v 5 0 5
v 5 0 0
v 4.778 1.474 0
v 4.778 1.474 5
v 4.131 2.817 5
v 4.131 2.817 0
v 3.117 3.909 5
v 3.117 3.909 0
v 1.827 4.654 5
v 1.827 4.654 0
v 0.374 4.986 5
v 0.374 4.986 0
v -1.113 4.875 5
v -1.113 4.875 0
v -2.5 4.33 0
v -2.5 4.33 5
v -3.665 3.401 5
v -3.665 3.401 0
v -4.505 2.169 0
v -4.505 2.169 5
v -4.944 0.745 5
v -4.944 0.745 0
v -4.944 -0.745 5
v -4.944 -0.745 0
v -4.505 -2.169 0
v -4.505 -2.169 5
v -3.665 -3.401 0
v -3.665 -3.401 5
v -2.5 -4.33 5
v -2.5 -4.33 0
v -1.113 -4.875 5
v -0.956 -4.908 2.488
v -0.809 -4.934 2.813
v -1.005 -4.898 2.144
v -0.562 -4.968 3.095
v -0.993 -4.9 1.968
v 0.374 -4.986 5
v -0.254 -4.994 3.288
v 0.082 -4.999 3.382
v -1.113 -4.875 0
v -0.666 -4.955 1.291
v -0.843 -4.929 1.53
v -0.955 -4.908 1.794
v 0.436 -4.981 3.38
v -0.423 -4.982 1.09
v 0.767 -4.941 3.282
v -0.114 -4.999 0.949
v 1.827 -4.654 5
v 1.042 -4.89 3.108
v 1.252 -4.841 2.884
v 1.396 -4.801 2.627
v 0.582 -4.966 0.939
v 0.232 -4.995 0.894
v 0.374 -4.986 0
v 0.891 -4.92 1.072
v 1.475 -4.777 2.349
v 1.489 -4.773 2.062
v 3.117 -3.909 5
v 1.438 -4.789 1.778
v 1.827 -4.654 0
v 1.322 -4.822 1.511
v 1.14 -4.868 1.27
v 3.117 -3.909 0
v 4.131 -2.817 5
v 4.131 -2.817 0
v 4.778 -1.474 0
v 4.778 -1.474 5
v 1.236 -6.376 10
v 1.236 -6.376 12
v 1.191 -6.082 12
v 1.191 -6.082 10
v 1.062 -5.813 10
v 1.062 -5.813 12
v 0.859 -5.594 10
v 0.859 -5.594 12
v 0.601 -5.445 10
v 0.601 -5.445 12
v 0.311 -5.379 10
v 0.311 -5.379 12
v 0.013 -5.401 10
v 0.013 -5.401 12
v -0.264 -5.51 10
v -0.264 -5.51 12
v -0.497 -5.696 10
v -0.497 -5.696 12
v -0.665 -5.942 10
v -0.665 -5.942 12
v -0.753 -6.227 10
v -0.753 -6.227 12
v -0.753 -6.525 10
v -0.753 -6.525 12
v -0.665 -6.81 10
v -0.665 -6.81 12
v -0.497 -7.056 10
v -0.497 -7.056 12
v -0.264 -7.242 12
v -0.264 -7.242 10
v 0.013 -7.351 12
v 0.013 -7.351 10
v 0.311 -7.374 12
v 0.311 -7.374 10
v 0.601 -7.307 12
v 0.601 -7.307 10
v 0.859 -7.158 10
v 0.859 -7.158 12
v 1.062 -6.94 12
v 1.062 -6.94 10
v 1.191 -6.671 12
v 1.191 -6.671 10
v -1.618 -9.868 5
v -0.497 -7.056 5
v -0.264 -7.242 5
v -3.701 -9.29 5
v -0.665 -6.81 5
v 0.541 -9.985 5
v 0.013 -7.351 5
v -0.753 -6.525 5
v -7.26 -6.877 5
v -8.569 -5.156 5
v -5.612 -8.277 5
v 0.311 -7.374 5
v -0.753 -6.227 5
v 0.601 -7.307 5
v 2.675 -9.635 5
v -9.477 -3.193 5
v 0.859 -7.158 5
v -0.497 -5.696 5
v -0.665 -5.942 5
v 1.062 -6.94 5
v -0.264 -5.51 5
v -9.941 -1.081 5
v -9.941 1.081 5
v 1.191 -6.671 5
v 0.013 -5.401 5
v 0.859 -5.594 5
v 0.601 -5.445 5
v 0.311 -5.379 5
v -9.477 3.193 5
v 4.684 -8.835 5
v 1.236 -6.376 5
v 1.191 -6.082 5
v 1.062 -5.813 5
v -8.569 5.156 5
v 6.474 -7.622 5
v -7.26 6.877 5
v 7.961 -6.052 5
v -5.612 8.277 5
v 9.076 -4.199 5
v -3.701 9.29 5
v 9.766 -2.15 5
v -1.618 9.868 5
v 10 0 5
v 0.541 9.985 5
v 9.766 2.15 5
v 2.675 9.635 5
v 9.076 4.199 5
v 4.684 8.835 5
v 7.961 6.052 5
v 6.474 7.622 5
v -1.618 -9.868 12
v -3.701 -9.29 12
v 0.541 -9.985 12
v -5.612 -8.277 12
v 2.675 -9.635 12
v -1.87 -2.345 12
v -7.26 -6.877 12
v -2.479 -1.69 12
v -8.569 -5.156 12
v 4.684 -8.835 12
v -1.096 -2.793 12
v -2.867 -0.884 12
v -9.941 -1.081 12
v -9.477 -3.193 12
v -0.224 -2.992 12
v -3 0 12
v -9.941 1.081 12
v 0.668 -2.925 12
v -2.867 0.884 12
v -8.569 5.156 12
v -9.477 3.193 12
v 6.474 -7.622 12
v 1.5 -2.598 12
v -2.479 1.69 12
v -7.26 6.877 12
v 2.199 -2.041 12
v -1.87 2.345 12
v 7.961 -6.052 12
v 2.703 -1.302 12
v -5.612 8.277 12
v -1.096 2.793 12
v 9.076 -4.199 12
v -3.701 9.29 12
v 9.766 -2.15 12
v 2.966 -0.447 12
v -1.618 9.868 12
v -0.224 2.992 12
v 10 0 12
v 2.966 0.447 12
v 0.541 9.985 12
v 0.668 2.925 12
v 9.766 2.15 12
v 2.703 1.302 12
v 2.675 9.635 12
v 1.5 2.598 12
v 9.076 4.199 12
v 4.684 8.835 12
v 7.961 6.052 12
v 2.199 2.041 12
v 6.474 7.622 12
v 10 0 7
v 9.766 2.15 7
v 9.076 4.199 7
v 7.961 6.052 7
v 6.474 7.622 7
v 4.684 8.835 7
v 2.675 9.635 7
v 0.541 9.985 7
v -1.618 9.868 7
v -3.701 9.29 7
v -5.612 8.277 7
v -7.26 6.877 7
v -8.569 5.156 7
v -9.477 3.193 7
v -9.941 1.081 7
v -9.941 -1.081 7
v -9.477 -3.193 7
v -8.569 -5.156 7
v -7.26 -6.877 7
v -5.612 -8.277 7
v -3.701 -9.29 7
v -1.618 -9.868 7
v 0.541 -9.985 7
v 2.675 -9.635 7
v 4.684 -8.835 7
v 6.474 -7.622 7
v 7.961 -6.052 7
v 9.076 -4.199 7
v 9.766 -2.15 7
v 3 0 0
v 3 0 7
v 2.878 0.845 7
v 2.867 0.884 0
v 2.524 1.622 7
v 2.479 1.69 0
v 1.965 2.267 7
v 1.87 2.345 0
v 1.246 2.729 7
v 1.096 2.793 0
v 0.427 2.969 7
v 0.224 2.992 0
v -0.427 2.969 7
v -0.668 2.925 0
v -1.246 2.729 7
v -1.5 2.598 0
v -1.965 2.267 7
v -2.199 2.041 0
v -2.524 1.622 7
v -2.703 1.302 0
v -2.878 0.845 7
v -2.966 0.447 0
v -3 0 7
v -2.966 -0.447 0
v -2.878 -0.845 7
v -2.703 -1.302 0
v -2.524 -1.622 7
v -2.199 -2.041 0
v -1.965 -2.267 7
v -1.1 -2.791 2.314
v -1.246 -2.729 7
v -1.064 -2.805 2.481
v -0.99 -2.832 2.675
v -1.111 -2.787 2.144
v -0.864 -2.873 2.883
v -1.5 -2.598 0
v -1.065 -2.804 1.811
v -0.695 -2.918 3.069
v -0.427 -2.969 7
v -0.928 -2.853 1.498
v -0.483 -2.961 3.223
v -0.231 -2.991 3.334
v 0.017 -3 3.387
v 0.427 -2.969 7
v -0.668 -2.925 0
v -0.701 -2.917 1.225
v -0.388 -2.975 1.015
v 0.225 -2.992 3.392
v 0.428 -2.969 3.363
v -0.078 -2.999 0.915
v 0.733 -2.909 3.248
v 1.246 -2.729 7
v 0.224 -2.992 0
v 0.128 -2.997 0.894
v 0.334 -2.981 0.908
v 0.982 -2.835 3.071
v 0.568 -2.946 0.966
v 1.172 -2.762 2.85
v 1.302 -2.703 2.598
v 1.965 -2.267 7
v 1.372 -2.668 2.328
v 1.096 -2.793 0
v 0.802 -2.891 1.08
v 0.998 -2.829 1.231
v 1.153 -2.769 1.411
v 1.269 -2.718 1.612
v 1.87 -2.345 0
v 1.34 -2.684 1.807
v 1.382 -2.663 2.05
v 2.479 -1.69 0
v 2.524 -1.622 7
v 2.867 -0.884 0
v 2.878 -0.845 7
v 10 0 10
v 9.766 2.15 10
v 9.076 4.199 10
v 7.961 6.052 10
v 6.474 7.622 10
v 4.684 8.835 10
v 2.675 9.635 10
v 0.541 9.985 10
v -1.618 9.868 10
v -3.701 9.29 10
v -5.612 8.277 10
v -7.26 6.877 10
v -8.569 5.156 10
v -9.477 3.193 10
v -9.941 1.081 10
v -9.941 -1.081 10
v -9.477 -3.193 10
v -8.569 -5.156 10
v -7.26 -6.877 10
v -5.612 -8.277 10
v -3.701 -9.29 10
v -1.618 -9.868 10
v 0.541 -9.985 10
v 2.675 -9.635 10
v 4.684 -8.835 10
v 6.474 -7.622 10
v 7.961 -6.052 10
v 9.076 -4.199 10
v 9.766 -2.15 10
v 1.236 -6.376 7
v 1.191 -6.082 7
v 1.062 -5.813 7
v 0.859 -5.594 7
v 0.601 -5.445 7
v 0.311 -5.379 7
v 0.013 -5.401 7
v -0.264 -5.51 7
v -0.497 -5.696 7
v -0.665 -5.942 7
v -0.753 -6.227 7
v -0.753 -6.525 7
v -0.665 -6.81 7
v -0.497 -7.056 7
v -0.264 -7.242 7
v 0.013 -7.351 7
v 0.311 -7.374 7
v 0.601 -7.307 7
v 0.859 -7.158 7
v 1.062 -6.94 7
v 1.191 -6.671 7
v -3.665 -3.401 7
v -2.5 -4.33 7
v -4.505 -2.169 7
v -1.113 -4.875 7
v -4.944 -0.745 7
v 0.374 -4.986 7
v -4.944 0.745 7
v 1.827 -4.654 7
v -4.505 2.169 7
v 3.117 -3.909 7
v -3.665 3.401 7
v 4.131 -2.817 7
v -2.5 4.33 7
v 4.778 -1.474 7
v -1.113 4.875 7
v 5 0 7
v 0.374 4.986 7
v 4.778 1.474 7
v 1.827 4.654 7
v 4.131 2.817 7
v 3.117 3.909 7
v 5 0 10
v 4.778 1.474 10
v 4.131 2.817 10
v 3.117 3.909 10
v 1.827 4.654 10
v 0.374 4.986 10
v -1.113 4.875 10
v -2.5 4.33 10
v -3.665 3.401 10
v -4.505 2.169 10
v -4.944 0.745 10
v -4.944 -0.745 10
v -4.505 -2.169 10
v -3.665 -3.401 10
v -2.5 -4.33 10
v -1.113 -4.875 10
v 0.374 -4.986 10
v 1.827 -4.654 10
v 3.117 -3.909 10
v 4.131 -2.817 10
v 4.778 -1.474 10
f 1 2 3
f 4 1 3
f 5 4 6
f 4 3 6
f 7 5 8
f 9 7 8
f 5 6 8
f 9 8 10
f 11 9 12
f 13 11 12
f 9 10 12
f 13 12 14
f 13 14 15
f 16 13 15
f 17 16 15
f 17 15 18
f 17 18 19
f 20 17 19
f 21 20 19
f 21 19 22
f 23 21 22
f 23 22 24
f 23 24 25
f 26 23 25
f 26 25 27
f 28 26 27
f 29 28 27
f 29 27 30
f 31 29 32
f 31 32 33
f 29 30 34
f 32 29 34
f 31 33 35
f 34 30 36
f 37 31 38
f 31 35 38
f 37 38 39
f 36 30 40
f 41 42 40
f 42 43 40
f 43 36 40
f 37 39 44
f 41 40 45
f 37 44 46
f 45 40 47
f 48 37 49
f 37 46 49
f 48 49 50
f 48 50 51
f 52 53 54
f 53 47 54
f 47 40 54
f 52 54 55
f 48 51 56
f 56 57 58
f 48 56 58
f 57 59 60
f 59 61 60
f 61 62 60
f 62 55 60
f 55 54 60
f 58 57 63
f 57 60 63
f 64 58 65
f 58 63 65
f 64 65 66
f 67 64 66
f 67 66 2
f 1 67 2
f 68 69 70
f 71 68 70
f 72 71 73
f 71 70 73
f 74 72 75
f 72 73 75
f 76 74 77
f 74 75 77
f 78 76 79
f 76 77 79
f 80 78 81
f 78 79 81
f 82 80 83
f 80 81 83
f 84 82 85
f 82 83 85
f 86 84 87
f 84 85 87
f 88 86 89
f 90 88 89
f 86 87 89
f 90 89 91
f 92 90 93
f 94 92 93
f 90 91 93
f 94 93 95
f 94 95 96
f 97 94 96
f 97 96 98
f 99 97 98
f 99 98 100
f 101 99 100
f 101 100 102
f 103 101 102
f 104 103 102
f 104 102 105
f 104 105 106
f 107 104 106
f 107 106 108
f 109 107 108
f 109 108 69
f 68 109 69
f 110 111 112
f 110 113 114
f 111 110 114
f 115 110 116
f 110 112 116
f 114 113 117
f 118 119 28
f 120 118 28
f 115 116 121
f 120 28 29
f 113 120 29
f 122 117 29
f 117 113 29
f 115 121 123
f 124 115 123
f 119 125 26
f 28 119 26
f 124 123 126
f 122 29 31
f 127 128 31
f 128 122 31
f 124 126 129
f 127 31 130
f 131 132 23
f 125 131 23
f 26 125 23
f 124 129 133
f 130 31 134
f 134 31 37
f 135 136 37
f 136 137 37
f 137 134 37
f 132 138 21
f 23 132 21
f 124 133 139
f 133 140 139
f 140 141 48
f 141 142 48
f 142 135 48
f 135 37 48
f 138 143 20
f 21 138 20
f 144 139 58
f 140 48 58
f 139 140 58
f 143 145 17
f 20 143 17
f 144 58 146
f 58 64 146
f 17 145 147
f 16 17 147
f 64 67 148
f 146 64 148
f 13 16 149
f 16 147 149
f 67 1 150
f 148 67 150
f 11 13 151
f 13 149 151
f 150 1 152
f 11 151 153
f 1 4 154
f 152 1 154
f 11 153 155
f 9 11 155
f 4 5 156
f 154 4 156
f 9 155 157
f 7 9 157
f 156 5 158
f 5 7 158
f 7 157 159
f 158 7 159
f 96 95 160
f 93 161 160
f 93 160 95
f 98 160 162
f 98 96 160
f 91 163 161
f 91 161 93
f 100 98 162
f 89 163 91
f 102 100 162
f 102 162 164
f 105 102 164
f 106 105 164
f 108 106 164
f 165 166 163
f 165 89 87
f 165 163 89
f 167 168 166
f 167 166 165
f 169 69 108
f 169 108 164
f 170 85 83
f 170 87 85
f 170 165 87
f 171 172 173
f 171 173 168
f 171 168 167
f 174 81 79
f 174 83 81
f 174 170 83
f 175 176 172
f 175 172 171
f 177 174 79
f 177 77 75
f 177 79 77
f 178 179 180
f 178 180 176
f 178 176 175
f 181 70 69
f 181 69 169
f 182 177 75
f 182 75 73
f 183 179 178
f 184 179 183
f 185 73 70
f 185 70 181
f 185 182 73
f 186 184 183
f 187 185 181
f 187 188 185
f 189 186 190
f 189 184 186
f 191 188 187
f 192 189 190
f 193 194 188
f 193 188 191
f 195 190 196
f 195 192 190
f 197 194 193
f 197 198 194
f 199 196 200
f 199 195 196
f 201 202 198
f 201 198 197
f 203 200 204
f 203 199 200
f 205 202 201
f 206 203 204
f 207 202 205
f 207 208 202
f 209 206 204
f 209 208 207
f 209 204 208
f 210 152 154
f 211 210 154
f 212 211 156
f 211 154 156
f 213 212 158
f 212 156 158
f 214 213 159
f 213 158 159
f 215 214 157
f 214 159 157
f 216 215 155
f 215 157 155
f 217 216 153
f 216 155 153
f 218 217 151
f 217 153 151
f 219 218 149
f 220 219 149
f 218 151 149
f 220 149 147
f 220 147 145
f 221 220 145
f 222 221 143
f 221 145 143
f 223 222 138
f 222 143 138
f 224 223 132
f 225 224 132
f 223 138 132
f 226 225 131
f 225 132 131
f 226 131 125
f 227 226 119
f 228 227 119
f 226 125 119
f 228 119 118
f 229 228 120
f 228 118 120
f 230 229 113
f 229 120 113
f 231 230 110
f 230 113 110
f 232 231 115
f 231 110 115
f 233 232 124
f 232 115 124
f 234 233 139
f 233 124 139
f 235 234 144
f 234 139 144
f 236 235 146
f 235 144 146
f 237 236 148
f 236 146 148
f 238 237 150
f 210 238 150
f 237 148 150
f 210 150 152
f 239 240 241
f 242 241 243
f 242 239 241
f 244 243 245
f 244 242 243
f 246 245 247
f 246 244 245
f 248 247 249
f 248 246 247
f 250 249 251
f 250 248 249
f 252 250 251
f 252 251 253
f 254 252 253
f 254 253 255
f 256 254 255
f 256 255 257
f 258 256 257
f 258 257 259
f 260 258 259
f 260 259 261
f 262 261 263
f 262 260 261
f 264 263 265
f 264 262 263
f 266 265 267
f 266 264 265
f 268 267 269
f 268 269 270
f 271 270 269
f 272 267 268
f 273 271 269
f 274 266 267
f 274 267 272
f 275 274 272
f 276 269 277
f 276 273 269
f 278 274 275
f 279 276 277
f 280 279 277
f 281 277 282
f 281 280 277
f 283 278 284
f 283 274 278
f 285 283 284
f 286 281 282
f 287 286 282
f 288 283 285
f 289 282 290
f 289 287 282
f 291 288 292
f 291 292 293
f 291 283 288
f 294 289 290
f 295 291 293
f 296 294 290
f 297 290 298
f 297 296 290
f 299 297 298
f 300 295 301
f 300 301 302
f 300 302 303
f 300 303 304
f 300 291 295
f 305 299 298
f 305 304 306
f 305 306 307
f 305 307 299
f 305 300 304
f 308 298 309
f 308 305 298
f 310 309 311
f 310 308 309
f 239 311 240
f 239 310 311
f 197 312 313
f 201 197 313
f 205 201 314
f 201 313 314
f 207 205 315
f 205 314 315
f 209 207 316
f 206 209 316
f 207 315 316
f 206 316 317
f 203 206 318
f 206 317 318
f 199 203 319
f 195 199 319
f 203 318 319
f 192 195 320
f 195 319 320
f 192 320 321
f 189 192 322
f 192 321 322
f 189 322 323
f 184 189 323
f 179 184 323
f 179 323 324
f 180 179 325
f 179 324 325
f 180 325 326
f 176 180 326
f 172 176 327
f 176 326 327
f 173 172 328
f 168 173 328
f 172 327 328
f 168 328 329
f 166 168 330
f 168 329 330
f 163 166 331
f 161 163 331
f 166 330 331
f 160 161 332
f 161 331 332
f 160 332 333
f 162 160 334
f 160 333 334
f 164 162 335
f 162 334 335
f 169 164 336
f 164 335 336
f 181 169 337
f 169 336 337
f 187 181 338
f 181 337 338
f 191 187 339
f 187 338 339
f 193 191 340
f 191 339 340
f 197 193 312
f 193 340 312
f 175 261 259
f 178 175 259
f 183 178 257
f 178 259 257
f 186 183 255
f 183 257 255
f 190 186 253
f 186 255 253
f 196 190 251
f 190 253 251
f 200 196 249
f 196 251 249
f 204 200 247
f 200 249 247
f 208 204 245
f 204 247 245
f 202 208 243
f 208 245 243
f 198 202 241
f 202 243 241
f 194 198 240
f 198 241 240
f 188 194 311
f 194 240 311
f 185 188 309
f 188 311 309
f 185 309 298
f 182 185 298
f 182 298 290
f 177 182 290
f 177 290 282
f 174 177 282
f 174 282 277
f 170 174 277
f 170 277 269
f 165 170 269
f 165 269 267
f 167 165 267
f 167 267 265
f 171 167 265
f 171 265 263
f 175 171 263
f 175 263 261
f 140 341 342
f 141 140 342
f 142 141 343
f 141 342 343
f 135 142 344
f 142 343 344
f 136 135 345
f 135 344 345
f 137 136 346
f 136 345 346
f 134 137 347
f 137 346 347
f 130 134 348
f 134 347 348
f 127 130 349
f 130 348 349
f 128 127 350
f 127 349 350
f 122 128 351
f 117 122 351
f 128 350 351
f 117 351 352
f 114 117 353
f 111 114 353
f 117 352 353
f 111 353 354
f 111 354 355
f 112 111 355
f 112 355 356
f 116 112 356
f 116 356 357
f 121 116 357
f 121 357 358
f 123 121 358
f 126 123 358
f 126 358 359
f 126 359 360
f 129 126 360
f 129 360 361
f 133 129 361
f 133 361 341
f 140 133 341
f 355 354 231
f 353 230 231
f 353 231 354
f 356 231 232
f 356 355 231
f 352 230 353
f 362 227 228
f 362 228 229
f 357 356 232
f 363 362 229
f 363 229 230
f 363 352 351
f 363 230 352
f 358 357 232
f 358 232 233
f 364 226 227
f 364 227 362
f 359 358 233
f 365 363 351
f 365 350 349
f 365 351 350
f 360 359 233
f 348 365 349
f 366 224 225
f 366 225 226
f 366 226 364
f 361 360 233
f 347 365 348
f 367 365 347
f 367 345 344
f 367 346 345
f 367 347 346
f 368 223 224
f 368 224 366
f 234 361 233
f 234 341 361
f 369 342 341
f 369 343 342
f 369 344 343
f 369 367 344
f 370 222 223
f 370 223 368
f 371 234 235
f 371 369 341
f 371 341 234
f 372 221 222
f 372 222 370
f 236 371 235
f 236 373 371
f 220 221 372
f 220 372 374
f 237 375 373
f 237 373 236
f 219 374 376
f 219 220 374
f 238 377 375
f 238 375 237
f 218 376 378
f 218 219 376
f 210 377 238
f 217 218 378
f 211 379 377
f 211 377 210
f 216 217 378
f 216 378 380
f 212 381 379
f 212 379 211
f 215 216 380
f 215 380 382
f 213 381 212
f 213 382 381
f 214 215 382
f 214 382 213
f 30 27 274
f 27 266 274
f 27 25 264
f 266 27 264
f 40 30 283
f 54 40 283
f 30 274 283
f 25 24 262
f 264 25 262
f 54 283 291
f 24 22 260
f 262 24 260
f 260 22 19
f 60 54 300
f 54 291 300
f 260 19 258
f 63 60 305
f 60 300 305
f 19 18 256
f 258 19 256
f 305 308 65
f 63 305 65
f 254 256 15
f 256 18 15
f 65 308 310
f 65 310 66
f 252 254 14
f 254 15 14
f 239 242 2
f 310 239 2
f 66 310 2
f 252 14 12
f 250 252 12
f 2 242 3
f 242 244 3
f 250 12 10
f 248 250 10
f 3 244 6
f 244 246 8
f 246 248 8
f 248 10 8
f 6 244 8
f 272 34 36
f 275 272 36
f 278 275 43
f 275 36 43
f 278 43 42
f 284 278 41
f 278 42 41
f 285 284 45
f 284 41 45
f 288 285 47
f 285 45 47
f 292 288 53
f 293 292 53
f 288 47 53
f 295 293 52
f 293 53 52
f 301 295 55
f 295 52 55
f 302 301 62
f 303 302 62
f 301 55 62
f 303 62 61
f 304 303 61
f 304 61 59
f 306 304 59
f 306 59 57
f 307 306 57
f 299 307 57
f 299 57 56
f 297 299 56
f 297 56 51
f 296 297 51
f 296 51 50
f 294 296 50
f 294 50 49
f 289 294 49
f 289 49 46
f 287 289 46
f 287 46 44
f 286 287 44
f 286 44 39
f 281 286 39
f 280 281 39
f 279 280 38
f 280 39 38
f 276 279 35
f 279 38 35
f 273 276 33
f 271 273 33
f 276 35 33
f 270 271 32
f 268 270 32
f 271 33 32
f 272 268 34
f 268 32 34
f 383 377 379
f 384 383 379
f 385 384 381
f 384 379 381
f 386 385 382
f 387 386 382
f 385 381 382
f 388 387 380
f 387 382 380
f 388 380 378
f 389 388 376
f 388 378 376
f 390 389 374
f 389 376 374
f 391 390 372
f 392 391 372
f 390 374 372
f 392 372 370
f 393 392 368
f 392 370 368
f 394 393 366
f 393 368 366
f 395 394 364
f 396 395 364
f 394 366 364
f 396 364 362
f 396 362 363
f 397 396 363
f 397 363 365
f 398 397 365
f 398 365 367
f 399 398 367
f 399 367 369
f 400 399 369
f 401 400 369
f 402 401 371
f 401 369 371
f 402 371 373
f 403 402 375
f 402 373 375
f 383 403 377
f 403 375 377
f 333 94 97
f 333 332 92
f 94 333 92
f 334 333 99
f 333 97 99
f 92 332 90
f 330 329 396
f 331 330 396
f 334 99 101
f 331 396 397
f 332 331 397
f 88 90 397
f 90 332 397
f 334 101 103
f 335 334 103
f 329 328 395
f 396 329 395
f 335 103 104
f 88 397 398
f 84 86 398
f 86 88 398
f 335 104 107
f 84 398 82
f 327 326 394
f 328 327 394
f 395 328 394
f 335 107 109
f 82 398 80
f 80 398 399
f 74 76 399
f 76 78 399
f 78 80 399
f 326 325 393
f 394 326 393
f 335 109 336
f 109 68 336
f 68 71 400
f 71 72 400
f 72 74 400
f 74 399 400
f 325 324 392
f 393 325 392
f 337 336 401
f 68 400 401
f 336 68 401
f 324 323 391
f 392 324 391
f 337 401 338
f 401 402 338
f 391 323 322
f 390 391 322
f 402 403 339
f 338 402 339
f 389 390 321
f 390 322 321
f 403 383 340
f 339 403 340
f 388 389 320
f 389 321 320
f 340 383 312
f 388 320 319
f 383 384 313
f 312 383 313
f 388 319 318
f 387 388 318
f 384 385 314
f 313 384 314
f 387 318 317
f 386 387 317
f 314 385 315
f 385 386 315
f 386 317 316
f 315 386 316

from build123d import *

# Parameters (mm, degrees)
SKETCH_1_R          = 5
SKETCH_1_R_2        = 3
EXTRUDE_1_DEPTH     = 5
SKETCH_2_R          = 10
SKETCH_2_R_2        = 3
EXTRUDE_2_DEPTH     = 2
SKETCH_3_R          = 5
EXTRUDE_3_DEPTH     = 3
SKETCH_4_R          = 10
EXTRUDE_4_DEPTH     = 2
SKETCH_5_R          = 3
CUT_EXTRUDE_1_DEPTH = 16.779733838
M3X0_5_1_REACH      = 22.665
M3X0_5_1_BORE_R     = 1.25
SKETCH_7_R          = 1
CUT_EXTRUDE_2_DEPTH = 19.547237056


with BuildPart() as part:
    # ｽｹｯﾁ1 → ﾎﾞｽ - 押し出し1 (new body)
    with BuildSketch(Plane.XY):
        Circle(SKETCH_1_R)
        Circle(SKETCH_1_R_2, mode=Mode.SUBTRACT)
    extrude(amount=EXTRUDE_1_DEPTH)

    # ｽｹｯﾁ2 → ﾎﾞｽ - 押し出し2 (add)
    with BuildSketch(Plane.XY.offset(5)):
        Circle(SKETCH_2_R)
        Circle(SKETCH_2_R_2, mode=Mode.SUBTRACT)
    extrude(amount=EXTRUDE_2_DEPTH)

    # ｽｹｯﾁ3 → ﾎﾞｽ - 押し出し3 (add)
    with BuildSketch(Plane.XY.offset(7)):
        Circle(SKETCH_3_R)
    extrude(amount=EXTRUDE_3_DEPTH)

    # ｽｹｯﾁ4 → ﾎﾞｽ - 押し出し4 (add)
    with BuildSketch(Plane.XY.offset(10)):
        Circle(SKETCH_4_R)
    extrude(amount=EXTRUDE_4_DEPTH)

    # ｽｹｯﾁ5 → ｶｯﾄ - 押し出し1 (cut, through all)
    with BuildSketch(Plane(origin=(0, 0, 7), x_dir=(-1, 0, 0), z_dir=(0, 0, -1))):
        Circle(SKETCH_5_R)
    extrude(amount=-CUT_EXTRUDE_1_DEPTH, mode=Mode.SUBTRACT)

    # M3x0.5 ねじ穴1 bore (on position points) → M3x0.5 ねじ穴1 (cut, up to next)
    with BuildSketch(Plane(origin=(0.251235543, -4.993684081, 2.143915345), x_dir=(-0.998736816219, -0.050247108654, 0), z_dir=(0.050247108654, -0.998736816219, 0)), mode=Mode.PRIVATE) as m3x0_5_1_sk1:
        Circle(M3X0_5_1_BORE_R)
    m3x0_5_1_tool1 = extrude(m3x0_5_1_sk1.sketch, amount=-M3X0_5_1_REACH, mode=Mode.PRIVATE) & part.part
    add(m3x0_5_1_tool1.solids().sort_by_distance((0.251236, -4.993684, 2.143915))[0], mode=Mode.SUBTRACT)

    # ｽｹｯﾁ7 → ｶｯﾄ - 押し出し2 (cut, through all)
    with BuildSketch(Plane.XY.offset(12)):
        with Locations((0.235884413, -6.376305987)):
            Circle(SKETCH_7_R)
    extrude(amount=-CUT_EXTRUDE_2_DEPTH, mode=Mode.SUBTRACT)


solid = part.part
